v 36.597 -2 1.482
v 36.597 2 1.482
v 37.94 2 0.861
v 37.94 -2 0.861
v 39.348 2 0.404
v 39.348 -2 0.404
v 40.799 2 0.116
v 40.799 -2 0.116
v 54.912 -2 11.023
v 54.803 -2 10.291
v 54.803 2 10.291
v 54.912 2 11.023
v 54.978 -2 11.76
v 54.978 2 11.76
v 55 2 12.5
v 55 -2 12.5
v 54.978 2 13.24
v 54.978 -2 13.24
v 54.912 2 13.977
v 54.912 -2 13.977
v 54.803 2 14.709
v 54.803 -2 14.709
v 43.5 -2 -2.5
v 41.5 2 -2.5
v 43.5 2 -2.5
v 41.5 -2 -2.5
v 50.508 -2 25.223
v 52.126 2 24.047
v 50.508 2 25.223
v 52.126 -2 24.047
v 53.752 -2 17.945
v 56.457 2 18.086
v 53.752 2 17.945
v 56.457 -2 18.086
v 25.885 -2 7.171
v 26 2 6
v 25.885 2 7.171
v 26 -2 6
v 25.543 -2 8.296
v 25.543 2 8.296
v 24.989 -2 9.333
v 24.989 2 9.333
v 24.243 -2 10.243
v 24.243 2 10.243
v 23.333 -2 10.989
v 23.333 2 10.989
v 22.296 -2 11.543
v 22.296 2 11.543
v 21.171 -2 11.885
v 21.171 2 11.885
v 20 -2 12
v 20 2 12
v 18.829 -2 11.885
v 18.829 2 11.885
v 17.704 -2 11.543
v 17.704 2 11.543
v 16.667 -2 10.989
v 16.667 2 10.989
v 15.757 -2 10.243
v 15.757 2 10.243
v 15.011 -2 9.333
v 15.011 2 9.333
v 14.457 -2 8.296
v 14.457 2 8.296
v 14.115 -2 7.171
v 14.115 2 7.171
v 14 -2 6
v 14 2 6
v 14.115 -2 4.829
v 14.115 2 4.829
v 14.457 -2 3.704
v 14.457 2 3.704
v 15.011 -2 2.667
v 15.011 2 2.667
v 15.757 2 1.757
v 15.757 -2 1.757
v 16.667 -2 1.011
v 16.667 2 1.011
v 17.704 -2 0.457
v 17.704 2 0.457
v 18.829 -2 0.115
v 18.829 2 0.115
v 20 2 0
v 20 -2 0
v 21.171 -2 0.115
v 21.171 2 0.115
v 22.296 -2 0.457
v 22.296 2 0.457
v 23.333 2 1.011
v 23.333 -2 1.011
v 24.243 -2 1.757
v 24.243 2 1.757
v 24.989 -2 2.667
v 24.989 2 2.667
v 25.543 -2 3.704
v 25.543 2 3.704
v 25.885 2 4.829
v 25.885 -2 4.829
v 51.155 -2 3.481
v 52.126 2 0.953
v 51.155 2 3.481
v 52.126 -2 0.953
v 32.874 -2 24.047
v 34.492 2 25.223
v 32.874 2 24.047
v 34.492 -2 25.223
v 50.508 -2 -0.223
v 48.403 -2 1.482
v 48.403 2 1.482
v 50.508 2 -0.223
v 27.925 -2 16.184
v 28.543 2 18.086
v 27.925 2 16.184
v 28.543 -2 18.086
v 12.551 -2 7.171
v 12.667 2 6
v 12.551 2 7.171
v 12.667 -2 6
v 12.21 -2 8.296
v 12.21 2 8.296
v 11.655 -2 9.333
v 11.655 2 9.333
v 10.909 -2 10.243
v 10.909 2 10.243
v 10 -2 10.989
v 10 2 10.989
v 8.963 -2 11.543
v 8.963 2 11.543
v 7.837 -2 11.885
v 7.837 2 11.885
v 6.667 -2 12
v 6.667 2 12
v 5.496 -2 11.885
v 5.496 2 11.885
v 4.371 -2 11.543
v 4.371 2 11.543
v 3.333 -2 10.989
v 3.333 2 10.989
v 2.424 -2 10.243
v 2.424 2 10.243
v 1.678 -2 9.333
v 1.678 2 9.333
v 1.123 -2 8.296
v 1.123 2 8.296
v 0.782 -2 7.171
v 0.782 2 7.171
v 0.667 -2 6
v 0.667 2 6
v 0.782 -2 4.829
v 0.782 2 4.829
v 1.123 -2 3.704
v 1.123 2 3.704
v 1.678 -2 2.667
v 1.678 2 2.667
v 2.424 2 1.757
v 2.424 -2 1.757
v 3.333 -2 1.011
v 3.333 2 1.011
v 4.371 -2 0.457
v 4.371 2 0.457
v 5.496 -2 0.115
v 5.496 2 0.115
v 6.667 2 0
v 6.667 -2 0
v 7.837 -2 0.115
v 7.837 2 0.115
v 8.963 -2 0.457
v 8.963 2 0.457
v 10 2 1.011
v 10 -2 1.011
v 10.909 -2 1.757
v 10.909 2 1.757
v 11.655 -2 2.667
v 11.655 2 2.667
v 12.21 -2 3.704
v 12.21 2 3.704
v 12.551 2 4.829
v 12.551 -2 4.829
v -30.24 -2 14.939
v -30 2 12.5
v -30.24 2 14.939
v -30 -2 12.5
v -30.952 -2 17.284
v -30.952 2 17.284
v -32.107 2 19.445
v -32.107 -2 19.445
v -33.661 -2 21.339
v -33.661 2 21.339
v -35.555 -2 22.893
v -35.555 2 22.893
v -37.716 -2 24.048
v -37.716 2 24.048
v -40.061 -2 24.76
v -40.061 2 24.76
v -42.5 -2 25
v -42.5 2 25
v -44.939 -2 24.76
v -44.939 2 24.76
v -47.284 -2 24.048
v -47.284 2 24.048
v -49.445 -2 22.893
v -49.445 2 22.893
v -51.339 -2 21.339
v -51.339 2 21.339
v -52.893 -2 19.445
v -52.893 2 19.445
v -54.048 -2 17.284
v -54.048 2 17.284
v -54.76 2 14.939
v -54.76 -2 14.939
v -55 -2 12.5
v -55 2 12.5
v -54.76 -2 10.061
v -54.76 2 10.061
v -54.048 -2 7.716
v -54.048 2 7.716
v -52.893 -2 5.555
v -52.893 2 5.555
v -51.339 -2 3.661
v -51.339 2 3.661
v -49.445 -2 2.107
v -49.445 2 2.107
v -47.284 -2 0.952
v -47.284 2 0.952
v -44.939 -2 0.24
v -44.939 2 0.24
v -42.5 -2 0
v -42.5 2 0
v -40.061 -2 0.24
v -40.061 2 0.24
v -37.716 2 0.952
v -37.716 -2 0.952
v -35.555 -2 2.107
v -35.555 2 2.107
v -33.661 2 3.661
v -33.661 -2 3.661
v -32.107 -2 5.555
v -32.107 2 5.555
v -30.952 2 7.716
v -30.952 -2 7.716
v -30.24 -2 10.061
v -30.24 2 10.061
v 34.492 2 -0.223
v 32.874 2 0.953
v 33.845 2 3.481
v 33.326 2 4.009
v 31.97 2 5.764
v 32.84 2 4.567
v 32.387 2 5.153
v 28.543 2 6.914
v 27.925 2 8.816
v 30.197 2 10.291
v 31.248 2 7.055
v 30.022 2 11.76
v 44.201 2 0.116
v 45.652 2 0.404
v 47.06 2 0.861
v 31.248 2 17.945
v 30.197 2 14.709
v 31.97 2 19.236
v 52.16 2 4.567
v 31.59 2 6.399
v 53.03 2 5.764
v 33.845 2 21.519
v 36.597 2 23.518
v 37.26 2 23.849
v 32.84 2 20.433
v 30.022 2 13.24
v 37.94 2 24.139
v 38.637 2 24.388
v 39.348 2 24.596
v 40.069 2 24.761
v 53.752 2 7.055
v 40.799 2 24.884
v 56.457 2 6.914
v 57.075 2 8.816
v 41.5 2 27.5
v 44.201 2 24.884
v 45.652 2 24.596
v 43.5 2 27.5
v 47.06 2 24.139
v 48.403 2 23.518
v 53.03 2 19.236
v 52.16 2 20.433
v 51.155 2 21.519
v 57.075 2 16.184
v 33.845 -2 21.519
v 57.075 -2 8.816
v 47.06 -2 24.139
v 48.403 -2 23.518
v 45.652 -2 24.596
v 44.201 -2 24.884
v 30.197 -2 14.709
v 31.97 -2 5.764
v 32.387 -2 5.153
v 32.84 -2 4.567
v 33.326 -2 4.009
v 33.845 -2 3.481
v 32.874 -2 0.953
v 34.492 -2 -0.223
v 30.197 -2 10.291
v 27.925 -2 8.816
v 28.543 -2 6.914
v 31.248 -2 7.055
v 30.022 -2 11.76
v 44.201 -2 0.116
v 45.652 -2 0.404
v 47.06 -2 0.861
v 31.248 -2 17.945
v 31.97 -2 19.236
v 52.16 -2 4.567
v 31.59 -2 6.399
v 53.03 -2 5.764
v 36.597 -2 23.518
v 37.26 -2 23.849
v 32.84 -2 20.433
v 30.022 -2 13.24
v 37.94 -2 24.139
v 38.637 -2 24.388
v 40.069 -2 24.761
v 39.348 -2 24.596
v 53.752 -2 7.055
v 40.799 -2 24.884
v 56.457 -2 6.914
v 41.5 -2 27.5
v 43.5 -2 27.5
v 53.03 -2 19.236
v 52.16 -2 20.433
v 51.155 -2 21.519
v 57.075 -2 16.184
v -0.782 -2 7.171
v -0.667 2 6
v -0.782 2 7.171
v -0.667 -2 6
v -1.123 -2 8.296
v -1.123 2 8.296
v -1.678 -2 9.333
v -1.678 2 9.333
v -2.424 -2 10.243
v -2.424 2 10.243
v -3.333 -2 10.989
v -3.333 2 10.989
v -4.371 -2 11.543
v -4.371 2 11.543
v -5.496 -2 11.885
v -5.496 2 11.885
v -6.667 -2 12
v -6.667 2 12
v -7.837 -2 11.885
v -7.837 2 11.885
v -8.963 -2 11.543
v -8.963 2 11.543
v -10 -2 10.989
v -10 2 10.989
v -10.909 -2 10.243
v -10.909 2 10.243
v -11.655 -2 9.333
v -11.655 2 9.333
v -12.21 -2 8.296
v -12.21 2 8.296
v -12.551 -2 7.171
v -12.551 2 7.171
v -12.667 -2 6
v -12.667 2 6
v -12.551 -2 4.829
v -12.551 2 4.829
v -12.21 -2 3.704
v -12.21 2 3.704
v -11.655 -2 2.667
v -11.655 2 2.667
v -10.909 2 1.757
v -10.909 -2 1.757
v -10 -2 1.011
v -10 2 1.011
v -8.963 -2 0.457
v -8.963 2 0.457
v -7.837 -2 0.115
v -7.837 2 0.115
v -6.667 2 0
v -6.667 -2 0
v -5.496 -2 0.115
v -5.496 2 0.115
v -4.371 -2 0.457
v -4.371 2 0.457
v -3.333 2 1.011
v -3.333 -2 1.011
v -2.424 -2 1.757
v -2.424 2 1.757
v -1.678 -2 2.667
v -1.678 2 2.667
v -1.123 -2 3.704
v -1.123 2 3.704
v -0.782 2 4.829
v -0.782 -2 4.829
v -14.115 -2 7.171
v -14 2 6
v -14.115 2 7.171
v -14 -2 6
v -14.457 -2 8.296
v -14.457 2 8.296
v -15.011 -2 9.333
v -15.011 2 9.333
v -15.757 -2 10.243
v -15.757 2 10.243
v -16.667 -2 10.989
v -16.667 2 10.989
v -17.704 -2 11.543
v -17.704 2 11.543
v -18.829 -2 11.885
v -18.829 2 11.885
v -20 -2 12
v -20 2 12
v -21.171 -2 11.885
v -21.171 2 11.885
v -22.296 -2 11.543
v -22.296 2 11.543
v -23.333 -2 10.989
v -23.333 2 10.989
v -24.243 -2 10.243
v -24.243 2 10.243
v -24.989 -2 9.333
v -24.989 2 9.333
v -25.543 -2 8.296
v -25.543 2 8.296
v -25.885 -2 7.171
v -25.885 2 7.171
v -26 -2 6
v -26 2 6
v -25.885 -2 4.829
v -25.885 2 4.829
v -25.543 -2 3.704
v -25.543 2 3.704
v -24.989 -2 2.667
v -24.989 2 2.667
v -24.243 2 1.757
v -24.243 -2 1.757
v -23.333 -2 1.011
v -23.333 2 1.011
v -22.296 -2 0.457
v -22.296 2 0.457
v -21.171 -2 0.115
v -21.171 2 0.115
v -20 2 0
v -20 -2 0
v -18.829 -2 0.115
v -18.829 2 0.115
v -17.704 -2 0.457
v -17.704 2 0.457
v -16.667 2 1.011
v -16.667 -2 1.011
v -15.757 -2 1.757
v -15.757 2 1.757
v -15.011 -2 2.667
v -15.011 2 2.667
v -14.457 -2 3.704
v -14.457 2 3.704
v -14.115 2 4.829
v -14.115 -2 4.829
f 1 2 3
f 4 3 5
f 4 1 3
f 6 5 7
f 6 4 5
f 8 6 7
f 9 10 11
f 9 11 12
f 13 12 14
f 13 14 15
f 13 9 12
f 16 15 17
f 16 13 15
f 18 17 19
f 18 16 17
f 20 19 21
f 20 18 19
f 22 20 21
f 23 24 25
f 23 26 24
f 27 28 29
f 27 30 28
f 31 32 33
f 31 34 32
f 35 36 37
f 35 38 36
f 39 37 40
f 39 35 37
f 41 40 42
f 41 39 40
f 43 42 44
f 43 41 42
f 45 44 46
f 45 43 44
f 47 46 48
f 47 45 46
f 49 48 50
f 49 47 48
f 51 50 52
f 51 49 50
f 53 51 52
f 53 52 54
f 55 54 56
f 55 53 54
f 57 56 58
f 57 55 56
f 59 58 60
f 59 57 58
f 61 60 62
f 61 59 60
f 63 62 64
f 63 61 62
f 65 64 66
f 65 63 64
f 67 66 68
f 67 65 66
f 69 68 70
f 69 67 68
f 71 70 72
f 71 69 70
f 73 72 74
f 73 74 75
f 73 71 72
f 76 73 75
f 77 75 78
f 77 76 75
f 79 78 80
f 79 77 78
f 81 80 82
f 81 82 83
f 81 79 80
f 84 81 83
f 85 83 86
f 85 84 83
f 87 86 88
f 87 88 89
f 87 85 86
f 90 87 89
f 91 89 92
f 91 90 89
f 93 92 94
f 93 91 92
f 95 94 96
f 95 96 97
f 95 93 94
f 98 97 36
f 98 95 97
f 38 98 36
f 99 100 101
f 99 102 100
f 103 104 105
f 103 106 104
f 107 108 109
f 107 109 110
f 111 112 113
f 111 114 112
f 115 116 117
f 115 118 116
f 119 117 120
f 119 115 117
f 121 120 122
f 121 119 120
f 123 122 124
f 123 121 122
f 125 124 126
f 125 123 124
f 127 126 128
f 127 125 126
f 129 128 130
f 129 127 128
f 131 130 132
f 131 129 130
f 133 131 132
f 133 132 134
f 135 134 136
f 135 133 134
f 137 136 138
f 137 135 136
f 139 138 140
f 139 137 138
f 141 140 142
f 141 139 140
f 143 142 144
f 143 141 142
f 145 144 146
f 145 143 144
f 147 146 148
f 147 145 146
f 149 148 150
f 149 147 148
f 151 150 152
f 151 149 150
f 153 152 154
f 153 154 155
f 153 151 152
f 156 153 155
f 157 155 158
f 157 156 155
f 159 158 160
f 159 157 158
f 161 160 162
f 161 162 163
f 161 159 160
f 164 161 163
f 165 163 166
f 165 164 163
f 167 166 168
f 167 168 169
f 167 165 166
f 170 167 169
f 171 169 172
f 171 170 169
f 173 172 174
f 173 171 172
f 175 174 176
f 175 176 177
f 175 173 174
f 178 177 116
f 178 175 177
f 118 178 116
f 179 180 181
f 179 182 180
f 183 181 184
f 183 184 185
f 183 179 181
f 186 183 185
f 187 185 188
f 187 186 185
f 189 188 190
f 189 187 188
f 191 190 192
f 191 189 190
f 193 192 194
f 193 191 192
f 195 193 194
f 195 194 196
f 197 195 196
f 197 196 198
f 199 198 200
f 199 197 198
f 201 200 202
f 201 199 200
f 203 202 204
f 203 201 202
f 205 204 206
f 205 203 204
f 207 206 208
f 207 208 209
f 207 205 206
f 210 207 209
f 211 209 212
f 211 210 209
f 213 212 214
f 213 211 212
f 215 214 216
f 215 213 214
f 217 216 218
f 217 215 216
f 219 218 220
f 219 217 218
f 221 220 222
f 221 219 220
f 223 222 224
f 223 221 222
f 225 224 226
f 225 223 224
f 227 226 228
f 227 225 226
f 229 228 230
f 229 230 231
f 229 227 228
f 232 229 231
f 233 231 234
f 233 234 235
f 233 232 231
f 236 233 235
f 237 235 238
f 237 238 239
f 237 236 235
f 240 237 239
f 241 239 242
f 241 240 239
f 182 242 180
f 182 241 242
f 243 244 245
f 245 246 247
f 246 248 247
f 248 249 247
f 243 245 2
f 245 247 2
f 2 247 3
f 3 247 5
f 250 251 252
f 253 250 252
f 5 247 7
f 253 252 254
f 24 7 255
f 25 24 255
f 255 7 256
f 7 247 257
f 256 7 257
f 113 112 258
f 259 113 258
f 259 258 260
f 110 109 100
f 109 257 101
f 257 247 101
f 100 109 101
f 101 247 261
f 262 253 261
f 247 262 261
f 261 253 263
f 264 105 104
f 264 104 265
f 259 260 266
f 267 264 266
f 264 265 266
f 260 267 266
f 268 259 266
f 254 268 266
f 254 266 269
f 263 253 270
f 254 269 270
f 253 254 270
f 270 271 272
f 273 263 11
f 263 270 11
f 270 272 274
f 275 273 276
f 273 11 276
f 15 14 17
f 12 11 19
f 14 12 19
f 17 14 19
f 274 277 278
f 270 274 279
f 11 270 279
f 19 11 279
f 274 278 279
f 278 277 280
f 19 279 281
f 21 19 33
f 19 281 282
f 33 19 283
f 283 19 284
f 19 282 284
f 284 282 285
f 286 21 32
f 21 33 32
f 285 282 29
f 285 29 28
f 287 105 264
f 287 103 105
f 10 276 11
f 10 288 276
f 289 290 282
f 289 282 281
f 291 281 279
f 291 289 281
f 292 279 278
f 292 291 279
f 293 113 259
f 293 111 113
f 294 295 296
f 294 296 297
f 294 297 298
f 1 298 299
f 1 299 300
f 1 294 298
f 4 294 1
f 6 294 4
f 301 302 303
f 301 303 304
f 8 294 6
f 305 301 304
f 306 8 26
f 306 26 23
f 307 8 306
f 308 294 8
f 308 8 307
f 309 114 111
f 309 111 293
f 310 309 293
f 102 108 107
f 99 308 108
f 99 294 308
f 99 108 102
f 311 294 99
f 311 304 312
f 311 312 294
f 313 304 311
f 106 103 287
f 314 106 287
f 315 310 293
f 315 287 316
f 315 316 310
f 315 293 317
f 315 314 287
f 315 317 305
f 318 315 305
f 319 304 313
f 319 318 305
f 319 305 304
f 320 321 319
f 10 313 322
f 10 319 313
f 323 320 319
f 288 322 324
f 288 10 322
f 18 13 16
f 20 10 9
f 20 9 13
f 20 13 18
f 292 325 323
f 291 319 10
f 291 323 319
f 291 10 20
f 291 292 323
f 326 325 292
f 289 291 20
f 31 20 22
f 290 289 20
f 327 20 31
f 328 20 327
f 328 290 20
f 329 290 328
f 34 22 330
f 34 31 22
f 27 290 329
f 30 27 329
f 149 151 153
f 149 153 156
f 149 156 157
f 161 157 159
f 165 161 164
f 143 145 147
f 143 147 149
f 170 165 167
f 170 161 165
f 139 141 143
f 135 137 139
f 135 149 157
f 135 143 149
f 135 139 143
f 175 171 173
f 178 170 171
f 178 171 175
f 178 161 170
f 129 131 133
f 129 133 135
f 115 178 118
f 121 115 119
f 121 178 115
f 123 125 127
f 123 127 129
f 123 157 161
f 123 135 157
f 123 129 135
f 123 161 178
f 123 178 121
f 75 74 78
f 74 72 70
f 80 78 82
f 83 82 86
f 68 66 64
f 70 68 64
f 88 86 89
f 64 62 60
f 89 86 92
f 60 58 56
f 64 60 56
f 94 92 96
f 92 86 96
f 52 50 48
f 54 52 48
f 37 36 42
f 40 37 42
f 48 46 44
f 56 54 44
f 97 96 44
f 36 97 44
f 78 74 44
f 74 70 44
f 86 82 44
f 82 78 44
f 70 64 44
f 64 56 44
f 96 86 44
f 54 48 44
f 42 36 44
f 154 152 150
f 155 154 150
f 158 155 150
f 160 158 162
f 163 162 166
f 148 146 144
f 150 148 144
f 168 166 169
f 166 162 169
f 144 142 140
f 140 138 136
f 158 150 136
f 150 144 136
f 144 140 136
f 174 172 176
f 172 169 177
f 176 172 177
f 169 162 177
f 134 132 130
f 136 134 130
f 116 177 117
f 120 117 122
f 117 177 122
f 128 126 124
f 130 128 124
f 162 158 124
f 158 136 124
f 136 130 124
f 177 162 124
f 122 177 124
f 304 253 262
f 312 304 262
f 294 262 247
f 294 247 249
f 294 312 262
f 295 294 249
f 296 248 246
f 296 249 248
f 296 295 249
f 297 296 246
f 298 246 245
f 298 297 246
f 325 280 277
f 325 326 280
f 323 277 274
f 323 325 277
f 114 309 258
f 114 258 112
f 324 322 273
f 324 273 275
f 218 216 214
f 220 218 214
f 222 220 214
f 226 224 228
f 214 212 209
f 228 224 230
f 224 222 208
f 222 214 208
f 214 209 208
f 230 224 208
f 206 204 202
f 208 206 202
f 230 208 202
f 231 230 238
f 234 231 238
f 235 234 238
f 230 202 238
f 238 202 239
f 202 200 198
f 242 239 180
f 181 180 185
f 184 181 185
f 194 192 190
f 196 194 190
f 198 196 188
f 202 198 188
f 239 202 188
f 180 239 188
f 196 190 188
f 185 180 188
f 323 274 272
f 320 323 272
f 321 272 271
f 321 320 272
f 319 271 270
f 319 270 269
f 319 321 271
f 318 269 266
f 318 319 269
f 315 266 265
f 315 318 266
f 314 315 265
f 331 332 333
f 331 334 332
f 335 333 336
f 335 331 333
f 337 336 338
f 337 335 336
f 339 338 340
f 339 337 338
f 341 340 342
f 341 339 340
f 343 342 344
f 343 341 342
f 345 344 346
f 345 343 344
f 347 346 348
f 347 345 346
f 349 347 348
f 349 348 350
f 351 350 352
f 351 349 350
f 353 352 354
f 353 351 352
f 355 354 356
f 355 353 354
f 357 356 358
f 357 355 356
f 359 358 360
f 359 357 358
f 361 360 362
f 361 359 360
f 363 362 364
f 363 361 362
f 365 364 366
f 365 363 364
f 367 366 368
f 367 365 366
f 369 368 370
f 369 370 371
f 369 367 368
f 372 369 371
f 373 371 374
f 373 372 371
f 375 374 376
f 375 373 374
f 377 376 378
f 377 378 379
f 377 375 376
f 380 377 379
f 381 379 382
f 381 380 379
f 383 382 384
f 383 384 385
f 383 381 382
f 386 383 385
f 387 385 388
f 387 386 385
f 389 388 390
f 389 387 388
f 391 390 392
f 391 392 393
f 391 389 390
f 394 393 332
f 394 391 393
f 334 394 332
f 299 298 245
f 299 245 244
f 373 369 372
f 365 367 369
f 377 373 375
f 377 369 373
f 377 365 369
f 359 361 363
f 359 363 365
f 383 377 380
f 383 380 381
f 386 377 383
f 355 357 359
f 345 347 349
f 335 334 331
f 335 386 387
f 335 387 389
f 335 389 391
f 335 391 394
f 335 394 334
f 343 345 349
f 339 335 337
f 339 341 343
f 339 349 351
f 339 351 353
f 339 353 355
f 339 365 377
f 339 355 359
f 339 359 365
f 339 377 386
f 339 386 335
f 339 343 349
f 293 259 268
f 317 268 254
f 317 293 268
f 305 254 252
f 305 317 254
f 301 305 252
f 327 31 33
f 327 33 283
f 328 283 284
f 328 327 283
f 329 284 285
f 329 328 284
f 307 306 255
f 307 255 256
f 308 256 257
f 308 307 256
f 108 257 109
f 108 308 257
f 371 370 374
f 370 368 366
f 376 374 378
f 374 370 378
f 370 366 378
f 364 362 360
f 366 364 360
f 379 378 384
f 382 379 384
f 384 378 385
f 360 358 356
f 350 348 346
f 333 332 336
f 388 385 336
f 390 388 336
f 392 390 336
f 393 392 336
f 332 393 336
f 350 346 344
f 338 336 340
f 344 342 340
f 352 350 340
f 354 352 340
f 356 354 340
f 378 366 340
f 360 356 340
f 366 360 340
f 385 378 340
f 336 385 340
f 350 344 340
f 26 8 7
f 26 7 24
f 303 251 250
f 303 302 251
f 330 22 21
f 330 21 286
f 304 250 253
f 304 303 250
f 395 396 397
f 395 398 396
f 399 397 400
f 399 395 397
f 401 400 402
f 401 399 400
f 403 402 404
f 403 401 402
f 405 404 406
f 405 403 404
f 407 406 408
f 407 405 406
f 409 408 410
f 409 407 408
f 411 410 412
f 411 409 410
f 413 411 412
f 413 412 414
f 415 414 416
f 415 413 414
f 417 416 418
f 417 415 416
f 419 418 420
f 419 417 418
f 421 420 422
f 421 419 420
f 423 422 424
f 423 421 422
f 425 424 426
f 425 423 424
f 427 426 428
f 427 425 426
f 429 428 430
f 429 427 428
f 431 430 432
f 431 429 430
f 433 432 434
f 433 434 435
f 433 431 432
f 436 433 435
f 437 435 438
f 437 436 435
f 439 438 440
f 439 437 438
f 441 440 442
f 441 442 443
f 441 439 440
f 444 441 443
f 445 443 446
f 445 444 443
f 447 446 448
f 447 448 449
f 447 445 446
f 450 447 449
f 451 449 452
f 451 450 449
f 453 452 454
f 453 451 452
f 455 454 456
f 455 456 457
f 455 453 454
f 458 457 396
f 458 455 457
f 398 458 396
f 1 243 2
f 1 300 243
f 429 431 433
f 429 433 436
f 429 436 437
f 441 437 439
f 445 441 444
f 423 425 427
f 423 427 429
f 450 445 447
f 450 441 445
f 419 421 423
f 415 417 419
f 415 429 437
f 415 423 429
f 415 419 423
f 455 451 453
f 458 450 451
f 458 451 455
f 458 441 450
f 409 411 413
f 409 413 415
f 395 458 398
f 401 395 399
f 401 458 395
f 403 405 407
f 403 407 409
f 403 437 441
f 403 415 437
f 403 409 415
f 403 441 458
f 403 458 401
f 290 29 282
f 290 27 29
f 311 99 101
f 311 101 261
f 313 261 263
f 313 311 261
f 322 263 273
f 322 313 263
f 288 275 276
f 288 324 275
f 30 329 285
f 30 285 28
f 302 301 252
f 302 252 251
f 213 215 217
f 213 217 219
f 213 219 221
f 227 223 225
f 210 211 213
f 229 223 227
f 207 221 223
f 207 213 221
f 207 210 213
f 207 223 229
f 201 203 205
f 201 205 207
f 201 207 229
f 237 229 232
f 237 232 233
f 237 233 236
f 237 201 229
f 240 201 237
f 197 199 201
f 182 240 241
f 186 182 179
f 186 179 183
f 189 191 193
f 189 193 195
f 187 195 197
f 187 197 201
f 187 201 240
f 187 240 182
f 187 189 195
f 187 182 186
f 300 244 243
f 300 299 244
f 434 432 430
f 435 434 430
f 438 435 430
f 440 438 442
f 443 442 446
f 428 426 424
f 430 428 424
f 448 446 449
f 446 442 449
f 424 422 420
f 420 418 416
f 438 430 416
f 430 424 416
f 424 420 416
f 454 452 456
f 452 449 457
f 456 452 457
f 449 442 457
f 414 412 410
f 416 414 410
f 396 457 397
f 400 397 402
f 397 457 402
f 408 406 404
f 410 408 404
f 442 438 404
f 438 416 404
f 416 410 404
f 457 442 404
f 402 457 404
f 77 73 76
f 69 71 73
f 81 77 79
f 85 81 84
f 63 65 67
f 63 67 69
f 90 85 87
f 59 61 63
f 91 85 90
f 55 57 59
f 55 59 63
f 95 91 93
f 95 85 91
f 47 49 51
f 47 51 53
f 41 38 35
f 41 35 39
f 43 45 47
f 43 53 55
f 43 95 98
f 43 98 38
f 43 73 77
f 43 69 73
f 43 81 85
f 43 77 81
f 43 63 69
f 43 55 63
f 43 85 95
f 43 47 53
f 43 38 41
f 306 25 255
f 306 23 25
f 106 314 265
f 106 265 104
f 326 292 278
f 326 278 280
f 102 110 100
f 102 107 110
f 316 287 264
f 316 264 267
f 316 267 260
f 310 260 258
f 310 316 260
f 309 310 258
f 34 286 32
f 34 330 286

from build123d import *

# Parameters (mm, degrees)
F1_DEPTH = 2
F0_R     = 6
F0_R_2   = 12.5
F2_COUNT = 10


with BuildPart() as f1:
    # F0 (on Front) → F1 (new body, symmetric)
    with BuildSketch(Plane.XZ):
        with BuildLine():
            ThreePointArc((44.2010303882, 0.1162810263), (51.9210636303, 4.2845535682), (55, 12.5))
            ThreePointArc((55, 12.5), (34.2845535682, 21.9210636303), (40.7989696118, 0.1162810263))
            ThreePointArc((40.7989696118, 0.1162810263), (42.5, 0), (44.2010303882, 0.1162810263))
        make_face()
        with BuildLine():
            ThreePointArc((44.2010303882, 0.1162810263), (42.5, 0), (40.7989696118, 0.1162810263))
            Line((40.7989696118, 0.1162810263), (41.5, -2.5))
            Line((41.5, -2.5), (42.5, -2.5))
            Line((42.5, -2.5), (43.5, -2.5))
            Line((43.5, -2.5), (44.2010303882, 0.1162810263))
        make_face()
    extrude(amount=F1_DEPTH, both=True)

    # F2: F1 ×10 about axis
    f2_axis = Axis((42.5, 0, 12.5), (0, -1, 0))


with BuildPart() as f1b:
    # F0 (on Front) → F1, piece 2 (new body, symmetric)
    with BuildSketch(Plane.XZ):
        with Locations((20, 6)):
            Circle(F0_R)
    extrude(amount=F1_DEPTH, both=True)


with BuildPart() as f1c:
    # F0 (on Front) → F1, piece 3 (new body, symmetric)
    with BuildSketch(Plane.XZ):
        with Locations((6.6666666667, 6)):
            Circle(F0_R)
    extrude(amount=F1_DEPTH, both=True)


with BuildPart() as f1d:
    # F0 (on Front) → F1, piece 4 (new body, symmetric)
    with BuildSketch(Plane.XZ):
        with Locations((-6.6666666667, 6)):
            Circle(F0_R)
    extrude(amount=F1_DEPTH, both=True)


with BuildPart() as f1e:
    # F0 (on Front) → F1, piece 5 (new body, symmetric)
    with BuildSketch(Plane.XZ):
        with Locations((-20, 6)):
            Circle(F0_R)
    extrude(amount=F1_DEPTH, both=True)


with BuildPart() as f1f:
    # F0 (on Front) → F1, piece 6 (new body, symmetric)
    with BuildSketch(Plane.XZ):
        with Locations((-42.5, 12.5)):
            Circle(F0_R_2)
    extrude(amount=F1_DEPTH, both=True)


with BuildPart() as f1_1:
    add(f1.part)
    for i in range(1, F2_COUNT):
        add(f1.part.rotate(f2_axis, i * 360 / F2_COUNT))


solid = Compound([f1b.part, f1c.part, f1d.part, f1e.part, f1f.part, f1_1.part])
